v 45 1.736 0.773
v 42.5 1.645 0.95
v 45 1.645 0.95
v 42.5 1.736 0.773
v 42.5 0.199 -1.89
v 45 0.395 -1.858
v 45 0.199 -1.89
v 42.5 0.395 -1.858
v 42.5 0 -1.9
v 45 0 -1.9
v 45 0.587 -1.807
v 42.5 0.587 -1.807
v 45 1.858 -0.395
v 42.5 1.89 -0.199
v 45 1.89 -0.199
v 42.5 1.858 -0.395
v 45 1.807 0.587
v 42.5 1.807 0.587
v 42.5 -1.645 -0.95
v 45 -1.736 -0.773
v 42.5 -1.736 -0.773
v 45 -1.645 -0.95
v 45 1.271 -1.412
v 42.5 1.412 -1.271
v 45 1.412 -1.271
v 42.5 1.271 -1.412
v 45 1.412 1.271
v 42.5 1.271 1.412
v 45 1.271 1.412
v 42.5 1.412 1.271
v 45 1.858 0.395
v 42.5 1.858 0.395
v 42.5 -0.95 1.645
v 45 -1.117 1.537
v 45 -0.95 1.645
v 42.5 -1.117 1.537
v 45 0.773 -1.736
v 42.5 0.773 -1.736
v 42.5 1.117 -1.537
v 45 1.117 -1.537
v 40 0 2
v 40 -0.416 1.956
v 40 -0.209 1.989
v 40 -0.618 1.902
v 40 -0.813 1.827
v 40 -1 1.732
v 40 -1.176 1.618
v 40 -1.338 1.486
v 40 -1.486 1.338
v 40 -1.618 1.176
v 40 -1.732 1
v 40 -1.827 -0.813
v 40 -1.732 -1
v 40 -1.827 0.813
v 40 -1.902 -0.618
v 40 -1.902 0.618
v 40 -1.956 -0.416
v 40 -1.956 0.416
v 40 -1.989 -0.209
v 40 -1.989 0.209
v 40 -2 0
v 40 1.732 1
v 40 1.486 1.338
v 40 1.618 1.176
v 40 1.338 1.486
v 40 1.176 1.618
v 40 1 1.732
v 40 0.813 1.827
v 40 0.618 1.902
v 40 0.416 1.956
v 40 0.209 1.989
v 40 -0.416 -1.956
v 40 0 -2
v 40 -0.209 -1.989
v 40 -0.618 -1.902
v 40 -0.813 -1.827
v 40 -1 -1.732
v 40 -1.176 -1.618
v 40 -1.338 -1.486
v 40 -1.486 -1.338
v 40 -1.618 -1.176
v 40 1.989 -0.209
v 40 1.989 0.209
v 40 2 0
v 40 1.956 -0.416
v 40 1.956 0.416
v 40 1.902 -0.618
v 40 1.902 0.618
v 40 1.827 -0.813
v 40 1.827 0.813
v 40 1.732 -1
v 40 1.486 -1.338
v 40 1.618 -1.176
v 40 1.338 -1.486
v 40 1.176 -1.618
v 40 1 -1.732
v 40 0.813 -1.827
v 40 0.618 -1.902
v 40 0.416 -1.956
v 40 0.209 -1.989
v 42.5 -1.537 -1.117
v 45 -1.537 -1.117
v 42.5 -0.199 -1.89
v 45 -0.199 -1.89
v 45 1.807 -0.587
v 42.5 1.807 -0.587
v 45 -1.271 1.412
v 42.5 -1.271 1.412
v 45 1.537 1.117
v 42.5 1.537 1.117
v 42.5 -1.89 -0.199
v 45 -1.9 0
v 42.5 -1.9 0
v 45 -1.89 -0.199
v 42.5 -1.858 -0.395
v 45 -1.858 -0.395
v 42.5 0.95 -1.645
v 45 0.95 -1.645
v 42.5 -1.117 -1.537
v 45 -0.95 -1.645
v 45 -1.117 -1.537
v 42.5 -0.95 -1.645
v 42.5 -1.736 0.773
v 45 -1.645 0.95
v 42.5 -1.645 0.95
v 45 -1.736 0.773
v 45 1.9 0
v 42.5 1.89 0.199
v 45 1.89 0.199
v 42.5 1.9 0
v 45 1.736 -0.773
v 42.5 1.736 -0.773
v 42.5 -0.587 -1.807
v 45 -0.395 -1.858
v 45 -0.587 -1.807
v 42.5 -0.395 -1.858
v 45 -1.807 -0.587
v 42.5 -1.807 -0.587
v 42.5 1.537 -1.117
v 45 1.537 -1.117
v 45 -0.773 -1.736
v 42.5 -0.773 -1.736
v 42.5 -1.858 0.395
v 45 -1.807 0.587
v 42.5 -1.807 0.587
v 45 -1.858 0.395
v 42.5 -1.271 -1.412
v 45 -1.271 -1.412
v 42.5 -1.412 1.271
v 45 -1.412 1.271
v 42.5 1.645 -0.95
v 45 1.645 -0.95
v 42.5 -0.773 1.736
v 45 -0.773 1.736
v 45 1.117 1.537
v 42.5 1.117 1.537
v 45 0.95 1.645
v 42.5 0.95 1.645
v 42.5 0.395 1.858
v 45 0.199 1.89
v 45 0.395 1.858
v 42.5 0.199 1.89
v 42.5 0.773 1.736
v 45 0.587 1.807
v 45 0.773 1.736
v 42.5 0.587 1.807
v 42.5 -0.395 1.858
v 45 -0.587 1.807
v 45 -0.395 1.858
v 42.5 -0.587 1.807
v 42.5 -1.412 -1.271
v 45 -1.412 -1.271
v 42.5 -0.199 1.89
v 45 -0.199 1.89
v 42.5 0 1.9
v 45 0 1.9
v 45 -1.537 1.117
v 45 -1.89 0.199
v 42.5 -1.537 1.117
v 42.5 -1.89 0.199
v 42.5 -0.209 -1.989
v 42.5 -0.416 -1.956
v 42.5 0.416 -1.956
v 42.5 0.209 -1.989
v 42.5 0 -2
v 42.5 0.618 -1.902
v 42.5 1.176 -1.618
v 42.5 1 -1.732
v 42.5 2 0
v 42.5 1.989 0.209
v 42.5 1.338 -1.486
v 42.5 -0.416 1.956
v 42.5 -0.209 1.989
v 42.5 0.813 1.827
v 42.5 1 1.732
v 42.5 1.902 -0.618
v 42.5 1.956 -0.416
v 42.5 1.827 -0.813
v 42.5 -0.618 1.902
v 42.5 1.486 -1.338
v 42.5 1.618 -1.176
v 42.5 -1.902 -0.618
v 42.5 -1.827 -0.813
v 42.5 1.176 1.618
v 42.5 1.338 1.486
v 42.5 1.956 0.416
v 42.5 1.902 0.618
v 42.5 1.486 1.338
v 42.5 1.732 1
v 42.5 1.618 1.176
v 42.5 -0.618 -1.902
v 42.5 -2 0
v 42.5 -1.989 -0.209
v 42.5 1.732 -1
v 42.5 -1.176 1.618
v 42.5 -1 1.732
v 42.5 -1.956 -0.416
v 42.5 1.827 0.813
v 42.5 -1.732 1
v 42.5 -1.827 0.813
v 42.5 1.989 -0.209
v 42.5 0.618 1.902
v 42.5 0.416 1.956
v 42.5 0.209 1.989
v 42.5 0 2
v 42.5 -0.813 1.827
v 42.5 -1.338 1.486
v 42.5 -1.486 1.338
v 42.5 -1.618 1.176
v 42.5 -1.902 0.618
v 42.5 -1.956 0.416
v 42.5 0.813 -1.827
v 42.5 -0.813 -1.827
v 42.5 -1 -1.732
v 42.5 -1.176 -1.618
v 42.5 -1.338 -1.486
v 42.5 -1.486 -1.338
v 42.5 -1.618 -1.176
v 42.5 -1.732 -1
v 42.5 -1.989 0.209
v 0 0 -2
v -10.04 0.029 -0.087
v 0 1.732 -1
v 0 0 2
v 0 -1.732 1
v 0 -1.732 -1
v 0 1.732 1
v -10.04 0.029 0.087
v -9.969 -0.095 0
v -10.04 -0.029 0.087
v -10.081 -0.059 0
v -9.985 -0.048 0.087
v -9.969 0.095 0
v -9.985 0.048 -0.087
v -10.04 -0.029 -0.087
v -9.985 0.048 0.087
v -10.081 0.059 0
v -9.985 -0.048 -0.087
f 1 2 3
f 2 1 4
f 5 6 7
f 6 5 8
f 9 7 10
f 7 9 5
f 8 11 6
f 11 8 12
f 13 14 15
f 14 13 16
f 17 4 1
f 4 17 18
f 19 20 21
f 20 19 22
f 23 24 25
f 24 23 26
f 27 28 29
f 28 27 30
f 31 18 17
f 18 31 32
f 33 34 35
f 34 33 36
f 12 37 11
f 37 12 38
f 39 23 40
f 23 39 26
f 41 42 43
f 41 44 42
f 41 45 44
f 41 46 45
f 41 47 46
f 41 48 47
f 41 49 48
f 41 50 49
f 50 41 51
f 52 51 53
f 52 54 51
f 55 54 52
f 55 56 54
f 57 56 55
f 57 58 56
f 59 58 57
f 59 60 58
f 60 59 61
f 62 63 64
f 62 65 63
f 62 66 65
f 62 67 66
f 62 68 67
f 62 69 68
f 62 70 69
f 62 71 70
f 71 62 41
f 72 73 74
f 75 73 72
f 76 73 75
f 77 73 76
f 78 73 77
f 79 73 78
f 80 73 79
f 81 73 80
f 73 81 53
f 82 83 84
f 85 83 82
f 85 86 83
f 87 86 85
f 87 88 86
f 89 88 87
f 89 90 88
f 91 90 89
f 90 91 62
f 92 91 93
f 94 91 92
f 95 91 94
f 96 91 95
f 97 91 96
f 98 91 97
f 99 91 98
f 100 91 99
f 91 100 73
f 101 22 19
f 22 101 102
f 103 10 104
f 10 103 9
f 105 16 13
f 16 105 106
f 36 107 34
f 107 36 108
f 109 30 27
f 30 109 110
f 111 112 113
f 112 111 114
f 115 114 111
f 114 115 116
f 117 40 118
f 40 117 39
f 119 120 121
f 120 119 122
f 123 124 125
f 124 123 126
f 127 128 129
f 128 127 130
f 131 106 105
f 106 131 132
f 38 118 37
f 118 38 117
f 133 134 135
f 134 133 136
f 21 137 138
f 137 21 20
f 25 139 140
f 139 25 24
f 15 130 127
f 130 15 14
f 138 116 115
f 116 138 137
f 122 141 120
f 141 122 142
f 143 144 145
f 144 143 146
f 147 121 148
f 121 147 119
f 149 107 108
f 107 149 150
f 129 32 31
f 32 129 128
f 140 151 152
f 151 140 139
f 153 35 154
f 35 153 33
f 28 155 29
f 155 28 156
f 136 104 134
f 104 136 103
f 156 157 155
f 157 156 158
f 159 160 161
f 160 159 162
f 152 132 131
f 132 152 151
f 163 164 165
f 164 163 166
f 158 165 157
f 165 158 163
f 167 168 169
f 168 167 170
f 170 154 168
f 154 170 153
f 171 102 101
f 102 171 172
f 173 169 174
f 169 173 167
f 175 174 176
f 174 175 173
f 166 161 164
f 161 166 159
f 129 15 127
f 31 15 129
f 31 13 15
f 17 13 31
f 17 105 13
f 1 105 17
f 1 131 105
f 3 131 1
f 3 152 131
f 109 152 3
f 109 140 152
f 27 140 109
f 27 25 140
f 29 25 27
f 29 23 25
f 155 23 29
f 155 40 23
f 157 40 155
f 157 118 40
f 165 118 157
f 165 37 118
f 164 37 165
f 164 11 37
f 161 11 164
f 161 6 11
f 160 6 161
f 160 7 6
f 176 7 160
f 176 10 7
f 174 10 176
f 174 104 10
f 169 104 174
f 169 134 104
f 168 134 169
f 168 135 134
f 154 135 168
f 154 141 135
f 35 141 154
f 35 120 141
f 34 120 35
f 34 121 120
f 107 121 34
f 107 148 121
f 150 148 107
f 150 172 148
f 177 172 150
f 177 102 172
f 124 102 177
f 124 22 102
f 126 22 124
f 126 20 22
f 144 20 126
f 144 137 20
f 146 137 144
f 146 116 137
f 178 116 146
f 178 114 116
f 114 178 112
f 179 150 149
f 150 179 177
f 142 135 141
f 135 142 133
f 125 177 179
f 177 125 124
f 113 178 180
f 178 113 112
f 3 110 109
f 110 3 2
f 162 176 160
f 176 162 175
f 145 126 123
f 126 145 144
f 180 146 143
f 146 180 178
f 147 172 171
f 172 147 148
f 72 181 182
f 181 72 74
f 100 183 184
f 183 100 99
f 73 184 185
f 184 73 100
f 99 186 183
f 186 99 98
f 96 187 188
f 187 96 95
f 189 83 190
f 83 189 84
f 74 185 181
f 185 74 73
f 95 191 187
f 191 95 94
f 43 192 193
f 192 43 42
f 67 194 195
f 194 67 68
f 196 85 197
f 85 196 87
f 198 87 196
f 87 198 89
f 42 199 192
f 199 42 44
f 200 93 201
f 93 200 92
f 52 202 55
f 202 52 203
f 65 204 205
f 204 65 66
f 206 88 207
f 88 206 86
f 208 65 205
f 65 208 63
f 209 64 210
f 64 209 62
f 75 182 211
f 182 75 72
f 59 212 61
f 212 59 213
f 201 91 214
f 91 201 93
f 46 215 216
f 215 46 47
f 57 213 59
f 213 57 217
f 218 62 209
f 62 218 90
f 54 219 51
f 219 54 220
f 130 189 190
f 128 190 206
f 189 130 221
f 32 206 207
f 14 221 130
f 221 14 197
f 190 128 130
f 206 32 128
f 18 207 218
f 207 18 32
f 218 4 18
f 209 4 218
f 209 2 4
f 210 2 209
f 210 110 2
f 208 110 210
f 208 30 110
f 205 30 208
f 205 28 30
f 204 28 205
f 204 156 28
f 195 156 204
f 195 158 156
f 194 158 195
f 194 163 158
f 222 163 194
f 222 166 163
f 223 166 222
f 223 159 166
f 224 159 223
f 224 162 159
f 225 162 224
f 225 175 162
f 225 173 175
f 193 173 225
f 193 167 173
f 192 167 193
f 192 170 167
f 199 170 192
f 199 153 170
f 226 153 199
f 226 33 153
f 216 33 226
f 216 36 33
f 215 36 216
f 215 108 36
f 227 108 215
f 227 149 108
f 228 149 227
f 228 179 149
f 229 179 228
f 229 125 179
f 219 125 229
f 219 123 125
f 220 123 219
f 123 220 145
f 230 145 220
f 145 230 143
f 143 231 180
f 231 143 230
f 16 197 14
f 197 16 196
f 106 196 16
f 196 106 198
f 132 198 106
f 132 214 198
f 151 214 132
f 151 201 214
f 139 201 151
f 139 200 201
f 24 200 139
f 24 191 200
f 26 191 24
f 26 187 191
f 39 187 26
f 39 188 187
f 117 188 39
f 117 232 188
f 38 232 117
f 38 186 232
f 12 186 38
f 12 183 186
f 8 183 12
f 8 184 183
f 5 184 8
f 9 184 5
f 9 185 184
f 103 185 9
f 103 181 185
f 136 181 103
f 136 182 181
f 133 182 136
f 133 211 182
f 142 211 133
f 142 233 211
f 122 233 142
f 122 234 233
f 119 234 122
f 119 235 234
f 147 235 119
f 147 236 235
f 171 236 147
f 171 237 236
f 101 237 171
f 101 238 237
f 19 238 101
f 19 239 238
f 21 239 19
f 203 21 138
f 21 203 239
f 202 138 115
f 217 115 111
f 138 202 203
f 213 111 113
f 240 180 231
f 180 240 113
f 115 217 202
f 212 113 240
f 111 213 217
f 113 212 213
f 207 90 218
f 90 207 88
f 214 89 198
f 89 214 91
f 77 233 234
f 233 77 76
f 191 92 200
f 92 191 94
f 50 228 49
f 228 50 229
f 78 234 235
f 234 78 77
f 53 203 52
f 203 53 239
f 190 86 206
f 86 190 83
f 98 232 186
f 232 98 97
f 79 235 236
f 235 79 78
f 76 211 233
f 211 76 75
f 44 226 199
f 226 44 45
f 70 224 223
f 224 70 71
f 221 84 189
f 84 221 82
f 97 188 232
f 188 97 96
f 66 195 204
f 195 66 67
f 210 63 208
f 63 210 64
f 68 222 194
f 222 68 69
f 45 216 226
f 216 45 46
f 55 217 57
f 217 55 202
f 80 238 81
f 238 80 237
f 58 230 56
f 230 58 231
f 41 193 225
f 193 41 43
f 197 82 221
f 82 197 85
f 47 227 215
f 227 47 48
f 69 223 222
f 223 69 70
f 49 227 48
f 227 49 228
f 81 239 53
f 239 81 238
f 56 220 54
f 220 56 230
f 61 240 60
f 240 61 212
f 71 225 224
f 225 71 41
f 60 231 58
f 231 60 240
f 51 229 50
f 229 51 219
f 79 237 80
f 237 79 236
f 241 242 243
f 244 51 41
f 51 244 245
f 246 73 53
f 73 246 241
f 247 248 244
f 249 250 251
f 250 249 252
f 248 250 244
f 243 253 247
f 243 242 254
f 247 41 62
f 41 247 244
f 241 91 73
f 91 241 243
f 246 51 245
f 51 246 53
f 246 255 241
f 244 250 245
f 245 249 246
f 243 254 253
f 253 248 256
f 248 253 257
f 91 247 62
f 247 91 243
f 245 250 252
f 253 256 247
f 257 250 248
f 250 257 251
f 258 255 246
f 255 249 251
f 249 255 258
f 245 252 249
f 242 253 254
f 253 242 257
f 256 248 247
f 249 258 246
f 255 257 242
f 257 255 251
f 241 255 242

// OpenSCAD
//PENCIL
pencil_length = 40;
pencil_radius = 2;

pencil(length=pencil_length,radius=pencil_radius);



 
module pencil_tip(length=10, radius=3){
  hull() {
    rotate([0,90,0]){
    linear_extrude(0.1) {
        circle(r=radius, $fn=6);
    }
    }
    translate([-length,0,0])
    sphere(0.1);    
  }
}

module pencil_body(length=20, radius=3){
    rotate([0,90,0])
        cylinder(h=length,r1=radius,r2=radius, $fn=6);
    }
module eraser(length=5, radius=4) {
    rotate([0,90,0])
      union(){
        cylinder(h=length,r1=radius-0.1,r2=radius-0.1, $fn=60);
        cylinder(h=length / 2,r1=radius,r2=radius, $fn=60);
      }
 }

module pencil(length=10,radius=3){
    
    union(){
    pencil_tip(radius=radius);
    pencil_body(length=length,radius=radius);
    translate([length,0,0])
        eraser(radius=radius);
    }
    }
